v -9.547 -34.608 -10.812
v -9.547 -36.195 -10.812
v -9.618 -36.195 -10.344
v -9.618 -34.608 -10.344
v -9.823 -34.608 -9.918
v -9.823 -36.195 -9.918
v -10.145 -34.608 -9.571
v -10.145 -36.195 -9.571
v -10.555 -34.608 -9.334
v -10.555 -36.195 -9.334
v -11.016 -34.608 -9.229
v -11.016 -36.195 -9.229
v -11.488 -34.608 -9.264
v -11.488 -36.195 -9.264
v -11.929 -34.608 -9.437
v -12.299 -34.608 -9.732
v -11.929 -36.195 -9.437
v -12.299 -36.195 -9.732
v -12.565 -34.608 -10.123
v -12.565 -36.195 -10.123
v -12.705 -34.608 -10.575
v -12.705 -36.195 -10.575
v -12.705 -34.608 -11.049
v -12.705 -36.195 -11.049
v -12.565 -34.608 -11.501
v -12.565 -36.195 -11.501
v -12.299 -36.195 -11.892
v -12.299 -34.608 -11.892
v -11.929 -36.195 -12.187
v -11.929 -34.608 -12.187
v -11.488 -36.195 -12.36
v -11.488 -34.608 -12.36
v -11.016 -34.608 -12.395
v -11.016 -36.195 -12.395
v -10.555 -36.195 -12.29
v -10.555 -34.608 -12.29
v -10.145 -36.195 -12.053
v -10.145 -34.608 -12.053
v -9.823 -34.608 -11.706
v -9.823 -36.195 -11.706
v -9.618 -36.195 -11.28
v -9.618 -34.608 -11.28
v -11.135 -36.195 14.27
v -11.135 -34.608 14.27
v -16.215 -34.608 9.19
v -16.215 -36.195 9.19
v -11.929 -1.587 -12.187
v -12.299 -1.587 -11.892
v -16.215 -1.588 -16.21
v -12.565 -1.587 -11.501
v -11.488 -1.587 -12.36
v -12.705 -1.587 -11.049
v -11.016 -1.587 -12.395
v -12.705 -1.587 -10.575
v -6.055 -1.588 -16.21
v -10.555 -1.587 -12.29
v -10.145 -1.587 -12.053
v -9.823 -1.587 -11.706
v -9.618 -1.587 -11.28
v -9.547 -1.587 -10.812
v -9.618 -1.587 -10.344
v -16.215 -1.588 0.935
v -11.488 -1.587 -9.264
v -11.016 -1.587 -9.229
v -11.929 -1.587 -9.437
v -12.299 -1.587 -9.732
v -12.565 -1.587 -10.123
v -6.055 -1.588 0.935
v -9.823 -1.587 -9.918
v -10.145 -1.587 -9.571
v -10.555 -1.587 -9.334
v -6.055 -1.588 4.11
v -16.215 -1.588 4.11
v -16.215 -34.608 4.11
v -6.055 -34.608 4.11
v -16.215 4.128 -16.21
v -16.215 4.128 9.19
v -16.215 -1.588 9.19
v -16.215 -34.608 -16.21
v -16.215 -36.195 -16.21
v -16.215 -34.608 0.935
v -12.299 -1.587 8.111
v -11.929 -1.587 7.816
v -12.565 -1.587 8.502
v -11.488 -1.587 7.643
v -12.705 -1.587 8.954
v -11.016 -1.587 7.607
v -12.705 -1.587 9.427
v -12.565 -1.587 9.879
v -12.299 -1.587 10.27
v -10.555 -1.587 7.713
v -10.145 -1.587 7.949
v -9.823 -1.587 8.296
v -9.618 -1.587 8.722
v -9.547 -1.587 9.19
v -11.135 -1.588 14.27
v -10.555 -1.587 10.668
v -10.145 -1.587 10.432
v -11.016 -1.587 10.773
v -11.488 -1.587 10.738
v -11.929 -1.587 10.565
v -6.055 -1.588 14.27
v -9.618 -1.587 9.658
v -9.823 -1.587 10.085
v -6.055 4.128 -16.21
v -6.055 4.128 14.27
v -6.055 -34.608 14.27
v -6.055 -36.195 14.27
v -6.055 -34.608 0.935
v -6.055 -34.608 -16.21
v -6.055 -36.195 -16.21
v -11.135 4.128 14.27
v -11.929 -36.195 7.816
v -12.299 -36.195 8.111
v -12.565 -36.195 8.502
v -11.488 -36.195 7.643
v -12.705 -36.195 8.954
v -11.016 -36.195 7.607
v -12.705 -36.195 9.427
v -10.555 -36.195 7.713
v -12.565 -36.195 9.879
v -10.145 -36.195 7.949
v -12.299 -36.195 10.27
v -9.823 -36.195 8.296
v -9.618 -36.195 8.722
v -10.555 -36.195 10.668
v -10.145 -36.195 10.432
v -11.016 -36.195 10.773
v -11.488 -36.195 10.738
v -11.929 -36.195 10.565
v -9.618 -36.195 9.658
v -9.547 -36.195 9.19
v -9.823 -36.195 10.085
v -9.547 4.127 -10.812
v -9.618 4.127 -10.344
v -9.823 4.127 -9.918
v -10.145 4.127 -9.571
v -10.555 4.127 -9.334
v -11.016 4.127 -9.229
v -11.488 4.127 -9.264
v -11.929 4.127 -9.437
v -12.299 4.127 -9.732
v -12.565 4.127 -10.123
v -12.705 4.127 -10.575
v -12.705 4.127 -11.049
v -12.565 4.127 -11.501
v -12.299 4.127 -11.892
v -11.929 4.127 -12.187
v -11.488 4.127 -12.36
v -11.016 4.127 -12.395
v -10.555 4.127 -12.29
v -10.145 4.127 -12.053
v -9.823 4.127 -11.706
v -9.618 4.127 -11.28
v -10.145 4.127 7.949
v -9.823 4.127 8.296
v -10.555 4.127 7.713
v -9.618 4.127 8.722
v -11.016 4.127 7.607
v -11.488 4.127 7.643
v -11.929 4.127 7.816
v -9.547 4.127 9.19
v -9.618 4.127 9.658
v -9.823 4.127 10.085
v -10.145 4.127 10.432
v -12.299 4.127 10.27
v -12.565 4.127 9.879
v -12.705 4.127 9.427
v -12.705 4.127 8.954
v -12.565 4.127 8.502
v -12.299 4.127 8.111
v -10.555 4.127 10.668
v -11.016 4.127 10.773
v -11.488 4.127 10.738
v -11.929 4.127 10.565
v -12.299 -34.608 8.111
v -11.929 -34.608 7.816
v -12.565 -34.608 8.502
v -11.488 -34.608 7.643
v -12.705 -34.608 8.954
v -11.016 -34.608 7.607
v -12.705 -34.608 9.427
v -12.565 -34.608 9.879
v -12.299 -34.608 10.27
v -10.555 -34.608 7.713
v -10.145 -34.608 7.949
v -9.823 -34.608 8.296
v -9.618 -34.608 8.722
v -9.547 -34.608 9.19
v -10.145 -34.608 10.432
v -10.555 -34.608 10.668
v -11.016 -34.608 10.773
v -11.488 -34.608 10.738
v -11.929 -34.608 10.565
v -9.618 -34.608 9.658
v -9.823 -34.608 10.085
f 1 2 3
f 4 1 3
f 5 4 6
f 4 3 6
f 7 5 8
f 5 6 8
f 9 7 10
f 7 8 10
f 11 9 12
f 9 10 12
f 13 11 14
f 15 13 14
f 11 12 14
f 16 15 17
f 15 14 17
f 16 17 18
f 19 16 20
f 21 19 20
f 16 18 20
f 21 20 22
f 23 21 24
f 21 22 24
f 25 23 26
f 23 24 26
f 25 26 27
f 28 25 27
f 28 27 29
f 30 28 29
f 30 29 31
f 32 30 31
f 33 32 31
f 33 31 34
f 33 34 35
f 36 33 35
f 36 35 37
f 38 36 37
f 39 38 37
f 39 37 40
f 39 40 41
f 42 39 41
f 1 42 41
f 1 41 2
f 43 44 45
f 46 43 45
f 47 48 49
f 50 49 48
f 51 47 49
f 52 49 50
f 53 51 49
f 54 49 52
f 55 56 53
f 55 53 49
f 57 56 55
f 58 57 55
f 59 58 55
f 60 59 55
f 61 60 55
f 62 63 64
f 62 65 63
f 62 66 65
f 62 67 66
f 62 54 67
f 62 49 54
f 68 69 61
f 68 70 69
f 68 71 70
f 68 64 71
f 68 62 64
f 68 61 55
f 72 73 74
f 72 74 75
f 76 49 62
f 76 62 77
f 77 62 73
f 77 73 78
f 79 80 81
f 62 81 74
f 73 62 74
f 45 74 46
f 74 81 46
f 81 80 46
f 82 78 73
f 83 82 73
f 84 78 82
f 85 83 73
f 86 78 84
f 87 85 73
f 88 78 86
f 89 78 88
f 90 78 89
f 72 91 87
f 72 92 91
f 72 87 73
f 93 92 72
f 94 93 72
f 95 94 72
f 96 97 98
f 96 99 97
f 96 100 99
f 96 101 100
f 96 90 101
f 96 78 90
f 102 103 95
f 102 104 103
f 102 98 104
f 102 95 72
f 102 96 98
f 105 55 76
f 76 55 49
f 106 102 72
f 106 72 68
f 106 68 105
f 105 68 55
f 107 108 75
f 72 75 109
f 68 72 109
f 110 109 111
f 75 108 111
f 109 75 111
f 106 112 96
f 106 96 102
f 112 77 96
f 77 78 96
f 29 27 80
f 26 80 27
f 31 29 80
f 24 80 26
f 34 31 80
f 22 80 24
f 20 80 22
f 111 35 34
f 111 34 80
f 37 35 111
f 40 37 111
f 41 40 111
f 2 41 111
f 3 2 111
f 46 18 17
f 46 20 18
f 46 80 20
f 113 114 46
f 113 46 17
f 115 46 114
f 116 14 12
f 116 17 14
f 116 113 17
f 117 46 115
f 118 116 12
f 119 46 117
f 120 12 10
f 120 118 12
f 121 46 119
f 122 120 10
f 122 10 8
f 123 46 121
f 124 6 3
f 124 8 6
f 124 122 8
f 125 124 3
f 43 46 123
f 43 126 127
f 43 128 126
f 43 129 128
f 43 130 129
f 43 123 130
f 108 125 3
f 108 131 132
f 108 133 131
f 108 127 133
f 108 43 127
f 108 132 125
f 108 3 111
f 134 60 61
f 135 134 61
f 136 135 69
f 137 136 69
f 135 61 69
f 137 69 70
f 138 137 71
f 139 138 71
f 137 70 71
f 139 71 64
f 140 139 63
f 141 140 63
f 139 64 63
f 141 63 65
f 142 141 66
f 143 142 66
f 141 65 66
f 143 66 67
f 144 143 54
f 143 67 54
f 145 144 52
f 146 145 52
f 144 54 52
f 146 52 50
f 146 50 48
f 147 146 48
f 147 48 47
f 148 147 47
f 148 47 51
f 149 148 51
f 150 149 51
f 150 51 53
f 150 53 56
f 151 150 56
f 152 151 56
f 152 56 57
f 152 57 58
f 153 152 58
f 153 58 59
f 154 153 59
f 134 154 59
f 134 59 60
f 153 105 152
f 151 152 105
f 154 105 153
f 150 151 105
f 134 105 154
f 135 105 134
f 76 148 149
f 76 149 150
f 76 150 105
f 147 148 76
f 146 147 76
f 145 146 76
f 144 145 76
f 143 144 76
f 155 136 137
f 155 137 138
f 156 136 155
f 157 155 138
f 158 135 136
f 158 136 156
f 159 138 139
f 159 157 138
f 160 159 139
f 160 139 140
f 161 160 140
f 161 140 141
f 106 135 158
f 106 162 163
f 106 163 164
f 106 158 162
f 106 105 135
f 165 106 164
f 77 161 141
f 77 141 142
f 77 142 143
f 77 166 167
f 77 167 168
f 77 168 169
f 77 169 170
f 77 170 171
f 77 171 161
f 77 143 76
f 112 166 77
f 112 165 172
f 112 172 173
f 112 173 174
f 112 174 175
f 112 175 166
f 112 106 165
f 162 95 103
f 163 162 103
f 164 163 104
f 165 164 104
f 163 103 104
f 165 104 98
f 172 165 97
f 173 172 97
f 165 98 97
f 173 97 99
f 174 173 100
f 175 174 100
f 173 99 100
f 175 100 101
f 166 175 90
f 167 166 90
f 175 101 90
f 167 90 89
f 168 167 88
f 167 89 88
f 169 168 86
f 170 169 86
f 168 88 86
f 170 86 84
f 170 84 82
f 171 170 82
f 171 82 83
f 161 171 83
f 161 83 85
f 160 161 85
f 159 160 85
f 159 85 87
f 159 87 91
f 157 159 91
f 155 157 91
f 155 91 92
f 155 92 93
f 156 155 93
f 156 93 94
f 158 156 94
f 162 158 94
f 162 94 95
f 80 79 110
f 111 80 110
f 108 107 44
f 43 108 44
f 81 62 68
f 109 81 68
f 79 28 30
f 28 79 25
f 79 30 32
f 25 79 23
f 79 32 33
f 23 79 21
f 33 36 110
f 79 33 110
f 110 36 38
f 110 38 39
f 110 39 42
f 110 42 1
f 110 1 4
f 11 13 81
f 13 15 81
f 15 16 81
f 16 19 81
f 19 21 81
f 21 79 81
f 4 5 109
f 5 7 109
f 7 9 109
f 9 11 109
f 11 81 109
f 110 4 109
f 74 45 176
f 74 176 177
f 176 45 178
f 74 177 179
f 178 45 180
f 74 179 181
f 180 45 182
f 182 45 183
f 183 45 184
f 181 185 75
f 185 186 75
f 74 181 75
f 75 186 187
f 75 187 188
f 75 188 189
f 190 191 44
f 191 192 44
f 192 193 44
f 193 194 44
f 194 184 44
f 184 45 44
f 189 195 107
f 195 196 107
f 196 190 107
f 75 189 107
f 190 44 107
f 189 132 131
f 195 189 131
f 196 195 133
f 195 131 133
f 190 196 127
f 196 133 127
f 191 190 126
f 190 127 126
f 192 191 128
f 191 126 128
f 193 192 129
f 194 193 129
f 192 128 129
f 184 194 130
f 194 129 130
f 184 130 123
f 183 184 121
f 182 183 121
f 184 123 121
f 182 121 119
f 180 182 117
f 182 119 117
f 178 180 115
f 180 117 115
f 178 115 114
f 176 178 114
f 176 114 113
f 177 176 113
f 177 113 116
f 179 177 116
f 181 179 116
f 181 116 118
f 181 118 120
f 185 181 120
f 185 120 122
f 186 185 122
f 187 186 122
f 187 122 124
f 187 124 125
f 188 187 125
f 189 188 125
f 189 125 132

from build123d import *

# Parameters (mm, degrees)
F1_DEPTH  = 1.5875
F2_W      = 10.16
F2_H      = 3.175
F3_DEPTH  = 33.02
F5_DEPTH  = 1.5875
F7_DEPTH  = 4.1275
F8_R      = 1.5875
F9_DEPTH  = 50.8
F10_R     = 1.5875
F11_DEPTH = 50.8


with BuildPart() as f1:
    # F0 (on Front) → F1 (new body)
    with BuildSketch(Plane.XZ):
        Polygon((-11.134821, 14.270418), (-16.214821, 9.190418), (-16.214821, -16.209582), (-6.054821, -16.209582), (-6.054821, 14.270418), align=None)
    extrude(amount=F1_DEPTH)

    # F2 (on face) → F3 (join)
    with BuildSketch(Plane.XZ.offset(1.5875)):
        with Locations((-11.134821, 2.522918)):
            Rectangle(F2_W, F2_H)
    extrude(amount=F3_DEPTH)

    # F4 (on face) → F5 (join)
    with BuildSketch(Plane.XZ.offset(34.6075)):
        Polygon((-16.214821, 9.190418), (-16.214821, 4.110418), (-16.214821, 0.935418), (-16.214821, -16.209582), (-6.054821, -16.209582), (-6.054821, 0.935418), (-6.054821, 4.110418), (-6.054821, 14.270418), (-11.134821, 14.270418), align=None)
    extrude(amount=F5_DEPTH)

    # F6 (on face) → F7 (join)
    with BuildSketch(Plane(origin=(0, 0, 0), x_dir=(-1, 0, 0), z_dir=(0, 1, 0))):
        Polygon((6.054821, -16.209582), (16.214821, -16.209582), (16.214821, 9.190418), (11.134821, 14.270418), (6.054821, 14.270418), align=None)
    extrude(amount=F7_DEPTH)

    # F8 (on face) → F9 (cut)
    with BuildSketch(Plane.XZ.offset(36.195)):
        with Locations((-11.134821, -10.812082)):
            Circle(F8_R)
    extrude(amount=-F9_DEPTH, mode=Mode.SUBTRACT)

    # F10 (on face) → F11 (cut)
    with BuildSketch(Plane.XZ.offset(36.195)):
        with Locations((-11.134821, 9.190418)):
            Circle(F10_R)
    extrude(amount=-F11_DEPTH, mode=Mode.SUBTRACT)


solid = f1.part
